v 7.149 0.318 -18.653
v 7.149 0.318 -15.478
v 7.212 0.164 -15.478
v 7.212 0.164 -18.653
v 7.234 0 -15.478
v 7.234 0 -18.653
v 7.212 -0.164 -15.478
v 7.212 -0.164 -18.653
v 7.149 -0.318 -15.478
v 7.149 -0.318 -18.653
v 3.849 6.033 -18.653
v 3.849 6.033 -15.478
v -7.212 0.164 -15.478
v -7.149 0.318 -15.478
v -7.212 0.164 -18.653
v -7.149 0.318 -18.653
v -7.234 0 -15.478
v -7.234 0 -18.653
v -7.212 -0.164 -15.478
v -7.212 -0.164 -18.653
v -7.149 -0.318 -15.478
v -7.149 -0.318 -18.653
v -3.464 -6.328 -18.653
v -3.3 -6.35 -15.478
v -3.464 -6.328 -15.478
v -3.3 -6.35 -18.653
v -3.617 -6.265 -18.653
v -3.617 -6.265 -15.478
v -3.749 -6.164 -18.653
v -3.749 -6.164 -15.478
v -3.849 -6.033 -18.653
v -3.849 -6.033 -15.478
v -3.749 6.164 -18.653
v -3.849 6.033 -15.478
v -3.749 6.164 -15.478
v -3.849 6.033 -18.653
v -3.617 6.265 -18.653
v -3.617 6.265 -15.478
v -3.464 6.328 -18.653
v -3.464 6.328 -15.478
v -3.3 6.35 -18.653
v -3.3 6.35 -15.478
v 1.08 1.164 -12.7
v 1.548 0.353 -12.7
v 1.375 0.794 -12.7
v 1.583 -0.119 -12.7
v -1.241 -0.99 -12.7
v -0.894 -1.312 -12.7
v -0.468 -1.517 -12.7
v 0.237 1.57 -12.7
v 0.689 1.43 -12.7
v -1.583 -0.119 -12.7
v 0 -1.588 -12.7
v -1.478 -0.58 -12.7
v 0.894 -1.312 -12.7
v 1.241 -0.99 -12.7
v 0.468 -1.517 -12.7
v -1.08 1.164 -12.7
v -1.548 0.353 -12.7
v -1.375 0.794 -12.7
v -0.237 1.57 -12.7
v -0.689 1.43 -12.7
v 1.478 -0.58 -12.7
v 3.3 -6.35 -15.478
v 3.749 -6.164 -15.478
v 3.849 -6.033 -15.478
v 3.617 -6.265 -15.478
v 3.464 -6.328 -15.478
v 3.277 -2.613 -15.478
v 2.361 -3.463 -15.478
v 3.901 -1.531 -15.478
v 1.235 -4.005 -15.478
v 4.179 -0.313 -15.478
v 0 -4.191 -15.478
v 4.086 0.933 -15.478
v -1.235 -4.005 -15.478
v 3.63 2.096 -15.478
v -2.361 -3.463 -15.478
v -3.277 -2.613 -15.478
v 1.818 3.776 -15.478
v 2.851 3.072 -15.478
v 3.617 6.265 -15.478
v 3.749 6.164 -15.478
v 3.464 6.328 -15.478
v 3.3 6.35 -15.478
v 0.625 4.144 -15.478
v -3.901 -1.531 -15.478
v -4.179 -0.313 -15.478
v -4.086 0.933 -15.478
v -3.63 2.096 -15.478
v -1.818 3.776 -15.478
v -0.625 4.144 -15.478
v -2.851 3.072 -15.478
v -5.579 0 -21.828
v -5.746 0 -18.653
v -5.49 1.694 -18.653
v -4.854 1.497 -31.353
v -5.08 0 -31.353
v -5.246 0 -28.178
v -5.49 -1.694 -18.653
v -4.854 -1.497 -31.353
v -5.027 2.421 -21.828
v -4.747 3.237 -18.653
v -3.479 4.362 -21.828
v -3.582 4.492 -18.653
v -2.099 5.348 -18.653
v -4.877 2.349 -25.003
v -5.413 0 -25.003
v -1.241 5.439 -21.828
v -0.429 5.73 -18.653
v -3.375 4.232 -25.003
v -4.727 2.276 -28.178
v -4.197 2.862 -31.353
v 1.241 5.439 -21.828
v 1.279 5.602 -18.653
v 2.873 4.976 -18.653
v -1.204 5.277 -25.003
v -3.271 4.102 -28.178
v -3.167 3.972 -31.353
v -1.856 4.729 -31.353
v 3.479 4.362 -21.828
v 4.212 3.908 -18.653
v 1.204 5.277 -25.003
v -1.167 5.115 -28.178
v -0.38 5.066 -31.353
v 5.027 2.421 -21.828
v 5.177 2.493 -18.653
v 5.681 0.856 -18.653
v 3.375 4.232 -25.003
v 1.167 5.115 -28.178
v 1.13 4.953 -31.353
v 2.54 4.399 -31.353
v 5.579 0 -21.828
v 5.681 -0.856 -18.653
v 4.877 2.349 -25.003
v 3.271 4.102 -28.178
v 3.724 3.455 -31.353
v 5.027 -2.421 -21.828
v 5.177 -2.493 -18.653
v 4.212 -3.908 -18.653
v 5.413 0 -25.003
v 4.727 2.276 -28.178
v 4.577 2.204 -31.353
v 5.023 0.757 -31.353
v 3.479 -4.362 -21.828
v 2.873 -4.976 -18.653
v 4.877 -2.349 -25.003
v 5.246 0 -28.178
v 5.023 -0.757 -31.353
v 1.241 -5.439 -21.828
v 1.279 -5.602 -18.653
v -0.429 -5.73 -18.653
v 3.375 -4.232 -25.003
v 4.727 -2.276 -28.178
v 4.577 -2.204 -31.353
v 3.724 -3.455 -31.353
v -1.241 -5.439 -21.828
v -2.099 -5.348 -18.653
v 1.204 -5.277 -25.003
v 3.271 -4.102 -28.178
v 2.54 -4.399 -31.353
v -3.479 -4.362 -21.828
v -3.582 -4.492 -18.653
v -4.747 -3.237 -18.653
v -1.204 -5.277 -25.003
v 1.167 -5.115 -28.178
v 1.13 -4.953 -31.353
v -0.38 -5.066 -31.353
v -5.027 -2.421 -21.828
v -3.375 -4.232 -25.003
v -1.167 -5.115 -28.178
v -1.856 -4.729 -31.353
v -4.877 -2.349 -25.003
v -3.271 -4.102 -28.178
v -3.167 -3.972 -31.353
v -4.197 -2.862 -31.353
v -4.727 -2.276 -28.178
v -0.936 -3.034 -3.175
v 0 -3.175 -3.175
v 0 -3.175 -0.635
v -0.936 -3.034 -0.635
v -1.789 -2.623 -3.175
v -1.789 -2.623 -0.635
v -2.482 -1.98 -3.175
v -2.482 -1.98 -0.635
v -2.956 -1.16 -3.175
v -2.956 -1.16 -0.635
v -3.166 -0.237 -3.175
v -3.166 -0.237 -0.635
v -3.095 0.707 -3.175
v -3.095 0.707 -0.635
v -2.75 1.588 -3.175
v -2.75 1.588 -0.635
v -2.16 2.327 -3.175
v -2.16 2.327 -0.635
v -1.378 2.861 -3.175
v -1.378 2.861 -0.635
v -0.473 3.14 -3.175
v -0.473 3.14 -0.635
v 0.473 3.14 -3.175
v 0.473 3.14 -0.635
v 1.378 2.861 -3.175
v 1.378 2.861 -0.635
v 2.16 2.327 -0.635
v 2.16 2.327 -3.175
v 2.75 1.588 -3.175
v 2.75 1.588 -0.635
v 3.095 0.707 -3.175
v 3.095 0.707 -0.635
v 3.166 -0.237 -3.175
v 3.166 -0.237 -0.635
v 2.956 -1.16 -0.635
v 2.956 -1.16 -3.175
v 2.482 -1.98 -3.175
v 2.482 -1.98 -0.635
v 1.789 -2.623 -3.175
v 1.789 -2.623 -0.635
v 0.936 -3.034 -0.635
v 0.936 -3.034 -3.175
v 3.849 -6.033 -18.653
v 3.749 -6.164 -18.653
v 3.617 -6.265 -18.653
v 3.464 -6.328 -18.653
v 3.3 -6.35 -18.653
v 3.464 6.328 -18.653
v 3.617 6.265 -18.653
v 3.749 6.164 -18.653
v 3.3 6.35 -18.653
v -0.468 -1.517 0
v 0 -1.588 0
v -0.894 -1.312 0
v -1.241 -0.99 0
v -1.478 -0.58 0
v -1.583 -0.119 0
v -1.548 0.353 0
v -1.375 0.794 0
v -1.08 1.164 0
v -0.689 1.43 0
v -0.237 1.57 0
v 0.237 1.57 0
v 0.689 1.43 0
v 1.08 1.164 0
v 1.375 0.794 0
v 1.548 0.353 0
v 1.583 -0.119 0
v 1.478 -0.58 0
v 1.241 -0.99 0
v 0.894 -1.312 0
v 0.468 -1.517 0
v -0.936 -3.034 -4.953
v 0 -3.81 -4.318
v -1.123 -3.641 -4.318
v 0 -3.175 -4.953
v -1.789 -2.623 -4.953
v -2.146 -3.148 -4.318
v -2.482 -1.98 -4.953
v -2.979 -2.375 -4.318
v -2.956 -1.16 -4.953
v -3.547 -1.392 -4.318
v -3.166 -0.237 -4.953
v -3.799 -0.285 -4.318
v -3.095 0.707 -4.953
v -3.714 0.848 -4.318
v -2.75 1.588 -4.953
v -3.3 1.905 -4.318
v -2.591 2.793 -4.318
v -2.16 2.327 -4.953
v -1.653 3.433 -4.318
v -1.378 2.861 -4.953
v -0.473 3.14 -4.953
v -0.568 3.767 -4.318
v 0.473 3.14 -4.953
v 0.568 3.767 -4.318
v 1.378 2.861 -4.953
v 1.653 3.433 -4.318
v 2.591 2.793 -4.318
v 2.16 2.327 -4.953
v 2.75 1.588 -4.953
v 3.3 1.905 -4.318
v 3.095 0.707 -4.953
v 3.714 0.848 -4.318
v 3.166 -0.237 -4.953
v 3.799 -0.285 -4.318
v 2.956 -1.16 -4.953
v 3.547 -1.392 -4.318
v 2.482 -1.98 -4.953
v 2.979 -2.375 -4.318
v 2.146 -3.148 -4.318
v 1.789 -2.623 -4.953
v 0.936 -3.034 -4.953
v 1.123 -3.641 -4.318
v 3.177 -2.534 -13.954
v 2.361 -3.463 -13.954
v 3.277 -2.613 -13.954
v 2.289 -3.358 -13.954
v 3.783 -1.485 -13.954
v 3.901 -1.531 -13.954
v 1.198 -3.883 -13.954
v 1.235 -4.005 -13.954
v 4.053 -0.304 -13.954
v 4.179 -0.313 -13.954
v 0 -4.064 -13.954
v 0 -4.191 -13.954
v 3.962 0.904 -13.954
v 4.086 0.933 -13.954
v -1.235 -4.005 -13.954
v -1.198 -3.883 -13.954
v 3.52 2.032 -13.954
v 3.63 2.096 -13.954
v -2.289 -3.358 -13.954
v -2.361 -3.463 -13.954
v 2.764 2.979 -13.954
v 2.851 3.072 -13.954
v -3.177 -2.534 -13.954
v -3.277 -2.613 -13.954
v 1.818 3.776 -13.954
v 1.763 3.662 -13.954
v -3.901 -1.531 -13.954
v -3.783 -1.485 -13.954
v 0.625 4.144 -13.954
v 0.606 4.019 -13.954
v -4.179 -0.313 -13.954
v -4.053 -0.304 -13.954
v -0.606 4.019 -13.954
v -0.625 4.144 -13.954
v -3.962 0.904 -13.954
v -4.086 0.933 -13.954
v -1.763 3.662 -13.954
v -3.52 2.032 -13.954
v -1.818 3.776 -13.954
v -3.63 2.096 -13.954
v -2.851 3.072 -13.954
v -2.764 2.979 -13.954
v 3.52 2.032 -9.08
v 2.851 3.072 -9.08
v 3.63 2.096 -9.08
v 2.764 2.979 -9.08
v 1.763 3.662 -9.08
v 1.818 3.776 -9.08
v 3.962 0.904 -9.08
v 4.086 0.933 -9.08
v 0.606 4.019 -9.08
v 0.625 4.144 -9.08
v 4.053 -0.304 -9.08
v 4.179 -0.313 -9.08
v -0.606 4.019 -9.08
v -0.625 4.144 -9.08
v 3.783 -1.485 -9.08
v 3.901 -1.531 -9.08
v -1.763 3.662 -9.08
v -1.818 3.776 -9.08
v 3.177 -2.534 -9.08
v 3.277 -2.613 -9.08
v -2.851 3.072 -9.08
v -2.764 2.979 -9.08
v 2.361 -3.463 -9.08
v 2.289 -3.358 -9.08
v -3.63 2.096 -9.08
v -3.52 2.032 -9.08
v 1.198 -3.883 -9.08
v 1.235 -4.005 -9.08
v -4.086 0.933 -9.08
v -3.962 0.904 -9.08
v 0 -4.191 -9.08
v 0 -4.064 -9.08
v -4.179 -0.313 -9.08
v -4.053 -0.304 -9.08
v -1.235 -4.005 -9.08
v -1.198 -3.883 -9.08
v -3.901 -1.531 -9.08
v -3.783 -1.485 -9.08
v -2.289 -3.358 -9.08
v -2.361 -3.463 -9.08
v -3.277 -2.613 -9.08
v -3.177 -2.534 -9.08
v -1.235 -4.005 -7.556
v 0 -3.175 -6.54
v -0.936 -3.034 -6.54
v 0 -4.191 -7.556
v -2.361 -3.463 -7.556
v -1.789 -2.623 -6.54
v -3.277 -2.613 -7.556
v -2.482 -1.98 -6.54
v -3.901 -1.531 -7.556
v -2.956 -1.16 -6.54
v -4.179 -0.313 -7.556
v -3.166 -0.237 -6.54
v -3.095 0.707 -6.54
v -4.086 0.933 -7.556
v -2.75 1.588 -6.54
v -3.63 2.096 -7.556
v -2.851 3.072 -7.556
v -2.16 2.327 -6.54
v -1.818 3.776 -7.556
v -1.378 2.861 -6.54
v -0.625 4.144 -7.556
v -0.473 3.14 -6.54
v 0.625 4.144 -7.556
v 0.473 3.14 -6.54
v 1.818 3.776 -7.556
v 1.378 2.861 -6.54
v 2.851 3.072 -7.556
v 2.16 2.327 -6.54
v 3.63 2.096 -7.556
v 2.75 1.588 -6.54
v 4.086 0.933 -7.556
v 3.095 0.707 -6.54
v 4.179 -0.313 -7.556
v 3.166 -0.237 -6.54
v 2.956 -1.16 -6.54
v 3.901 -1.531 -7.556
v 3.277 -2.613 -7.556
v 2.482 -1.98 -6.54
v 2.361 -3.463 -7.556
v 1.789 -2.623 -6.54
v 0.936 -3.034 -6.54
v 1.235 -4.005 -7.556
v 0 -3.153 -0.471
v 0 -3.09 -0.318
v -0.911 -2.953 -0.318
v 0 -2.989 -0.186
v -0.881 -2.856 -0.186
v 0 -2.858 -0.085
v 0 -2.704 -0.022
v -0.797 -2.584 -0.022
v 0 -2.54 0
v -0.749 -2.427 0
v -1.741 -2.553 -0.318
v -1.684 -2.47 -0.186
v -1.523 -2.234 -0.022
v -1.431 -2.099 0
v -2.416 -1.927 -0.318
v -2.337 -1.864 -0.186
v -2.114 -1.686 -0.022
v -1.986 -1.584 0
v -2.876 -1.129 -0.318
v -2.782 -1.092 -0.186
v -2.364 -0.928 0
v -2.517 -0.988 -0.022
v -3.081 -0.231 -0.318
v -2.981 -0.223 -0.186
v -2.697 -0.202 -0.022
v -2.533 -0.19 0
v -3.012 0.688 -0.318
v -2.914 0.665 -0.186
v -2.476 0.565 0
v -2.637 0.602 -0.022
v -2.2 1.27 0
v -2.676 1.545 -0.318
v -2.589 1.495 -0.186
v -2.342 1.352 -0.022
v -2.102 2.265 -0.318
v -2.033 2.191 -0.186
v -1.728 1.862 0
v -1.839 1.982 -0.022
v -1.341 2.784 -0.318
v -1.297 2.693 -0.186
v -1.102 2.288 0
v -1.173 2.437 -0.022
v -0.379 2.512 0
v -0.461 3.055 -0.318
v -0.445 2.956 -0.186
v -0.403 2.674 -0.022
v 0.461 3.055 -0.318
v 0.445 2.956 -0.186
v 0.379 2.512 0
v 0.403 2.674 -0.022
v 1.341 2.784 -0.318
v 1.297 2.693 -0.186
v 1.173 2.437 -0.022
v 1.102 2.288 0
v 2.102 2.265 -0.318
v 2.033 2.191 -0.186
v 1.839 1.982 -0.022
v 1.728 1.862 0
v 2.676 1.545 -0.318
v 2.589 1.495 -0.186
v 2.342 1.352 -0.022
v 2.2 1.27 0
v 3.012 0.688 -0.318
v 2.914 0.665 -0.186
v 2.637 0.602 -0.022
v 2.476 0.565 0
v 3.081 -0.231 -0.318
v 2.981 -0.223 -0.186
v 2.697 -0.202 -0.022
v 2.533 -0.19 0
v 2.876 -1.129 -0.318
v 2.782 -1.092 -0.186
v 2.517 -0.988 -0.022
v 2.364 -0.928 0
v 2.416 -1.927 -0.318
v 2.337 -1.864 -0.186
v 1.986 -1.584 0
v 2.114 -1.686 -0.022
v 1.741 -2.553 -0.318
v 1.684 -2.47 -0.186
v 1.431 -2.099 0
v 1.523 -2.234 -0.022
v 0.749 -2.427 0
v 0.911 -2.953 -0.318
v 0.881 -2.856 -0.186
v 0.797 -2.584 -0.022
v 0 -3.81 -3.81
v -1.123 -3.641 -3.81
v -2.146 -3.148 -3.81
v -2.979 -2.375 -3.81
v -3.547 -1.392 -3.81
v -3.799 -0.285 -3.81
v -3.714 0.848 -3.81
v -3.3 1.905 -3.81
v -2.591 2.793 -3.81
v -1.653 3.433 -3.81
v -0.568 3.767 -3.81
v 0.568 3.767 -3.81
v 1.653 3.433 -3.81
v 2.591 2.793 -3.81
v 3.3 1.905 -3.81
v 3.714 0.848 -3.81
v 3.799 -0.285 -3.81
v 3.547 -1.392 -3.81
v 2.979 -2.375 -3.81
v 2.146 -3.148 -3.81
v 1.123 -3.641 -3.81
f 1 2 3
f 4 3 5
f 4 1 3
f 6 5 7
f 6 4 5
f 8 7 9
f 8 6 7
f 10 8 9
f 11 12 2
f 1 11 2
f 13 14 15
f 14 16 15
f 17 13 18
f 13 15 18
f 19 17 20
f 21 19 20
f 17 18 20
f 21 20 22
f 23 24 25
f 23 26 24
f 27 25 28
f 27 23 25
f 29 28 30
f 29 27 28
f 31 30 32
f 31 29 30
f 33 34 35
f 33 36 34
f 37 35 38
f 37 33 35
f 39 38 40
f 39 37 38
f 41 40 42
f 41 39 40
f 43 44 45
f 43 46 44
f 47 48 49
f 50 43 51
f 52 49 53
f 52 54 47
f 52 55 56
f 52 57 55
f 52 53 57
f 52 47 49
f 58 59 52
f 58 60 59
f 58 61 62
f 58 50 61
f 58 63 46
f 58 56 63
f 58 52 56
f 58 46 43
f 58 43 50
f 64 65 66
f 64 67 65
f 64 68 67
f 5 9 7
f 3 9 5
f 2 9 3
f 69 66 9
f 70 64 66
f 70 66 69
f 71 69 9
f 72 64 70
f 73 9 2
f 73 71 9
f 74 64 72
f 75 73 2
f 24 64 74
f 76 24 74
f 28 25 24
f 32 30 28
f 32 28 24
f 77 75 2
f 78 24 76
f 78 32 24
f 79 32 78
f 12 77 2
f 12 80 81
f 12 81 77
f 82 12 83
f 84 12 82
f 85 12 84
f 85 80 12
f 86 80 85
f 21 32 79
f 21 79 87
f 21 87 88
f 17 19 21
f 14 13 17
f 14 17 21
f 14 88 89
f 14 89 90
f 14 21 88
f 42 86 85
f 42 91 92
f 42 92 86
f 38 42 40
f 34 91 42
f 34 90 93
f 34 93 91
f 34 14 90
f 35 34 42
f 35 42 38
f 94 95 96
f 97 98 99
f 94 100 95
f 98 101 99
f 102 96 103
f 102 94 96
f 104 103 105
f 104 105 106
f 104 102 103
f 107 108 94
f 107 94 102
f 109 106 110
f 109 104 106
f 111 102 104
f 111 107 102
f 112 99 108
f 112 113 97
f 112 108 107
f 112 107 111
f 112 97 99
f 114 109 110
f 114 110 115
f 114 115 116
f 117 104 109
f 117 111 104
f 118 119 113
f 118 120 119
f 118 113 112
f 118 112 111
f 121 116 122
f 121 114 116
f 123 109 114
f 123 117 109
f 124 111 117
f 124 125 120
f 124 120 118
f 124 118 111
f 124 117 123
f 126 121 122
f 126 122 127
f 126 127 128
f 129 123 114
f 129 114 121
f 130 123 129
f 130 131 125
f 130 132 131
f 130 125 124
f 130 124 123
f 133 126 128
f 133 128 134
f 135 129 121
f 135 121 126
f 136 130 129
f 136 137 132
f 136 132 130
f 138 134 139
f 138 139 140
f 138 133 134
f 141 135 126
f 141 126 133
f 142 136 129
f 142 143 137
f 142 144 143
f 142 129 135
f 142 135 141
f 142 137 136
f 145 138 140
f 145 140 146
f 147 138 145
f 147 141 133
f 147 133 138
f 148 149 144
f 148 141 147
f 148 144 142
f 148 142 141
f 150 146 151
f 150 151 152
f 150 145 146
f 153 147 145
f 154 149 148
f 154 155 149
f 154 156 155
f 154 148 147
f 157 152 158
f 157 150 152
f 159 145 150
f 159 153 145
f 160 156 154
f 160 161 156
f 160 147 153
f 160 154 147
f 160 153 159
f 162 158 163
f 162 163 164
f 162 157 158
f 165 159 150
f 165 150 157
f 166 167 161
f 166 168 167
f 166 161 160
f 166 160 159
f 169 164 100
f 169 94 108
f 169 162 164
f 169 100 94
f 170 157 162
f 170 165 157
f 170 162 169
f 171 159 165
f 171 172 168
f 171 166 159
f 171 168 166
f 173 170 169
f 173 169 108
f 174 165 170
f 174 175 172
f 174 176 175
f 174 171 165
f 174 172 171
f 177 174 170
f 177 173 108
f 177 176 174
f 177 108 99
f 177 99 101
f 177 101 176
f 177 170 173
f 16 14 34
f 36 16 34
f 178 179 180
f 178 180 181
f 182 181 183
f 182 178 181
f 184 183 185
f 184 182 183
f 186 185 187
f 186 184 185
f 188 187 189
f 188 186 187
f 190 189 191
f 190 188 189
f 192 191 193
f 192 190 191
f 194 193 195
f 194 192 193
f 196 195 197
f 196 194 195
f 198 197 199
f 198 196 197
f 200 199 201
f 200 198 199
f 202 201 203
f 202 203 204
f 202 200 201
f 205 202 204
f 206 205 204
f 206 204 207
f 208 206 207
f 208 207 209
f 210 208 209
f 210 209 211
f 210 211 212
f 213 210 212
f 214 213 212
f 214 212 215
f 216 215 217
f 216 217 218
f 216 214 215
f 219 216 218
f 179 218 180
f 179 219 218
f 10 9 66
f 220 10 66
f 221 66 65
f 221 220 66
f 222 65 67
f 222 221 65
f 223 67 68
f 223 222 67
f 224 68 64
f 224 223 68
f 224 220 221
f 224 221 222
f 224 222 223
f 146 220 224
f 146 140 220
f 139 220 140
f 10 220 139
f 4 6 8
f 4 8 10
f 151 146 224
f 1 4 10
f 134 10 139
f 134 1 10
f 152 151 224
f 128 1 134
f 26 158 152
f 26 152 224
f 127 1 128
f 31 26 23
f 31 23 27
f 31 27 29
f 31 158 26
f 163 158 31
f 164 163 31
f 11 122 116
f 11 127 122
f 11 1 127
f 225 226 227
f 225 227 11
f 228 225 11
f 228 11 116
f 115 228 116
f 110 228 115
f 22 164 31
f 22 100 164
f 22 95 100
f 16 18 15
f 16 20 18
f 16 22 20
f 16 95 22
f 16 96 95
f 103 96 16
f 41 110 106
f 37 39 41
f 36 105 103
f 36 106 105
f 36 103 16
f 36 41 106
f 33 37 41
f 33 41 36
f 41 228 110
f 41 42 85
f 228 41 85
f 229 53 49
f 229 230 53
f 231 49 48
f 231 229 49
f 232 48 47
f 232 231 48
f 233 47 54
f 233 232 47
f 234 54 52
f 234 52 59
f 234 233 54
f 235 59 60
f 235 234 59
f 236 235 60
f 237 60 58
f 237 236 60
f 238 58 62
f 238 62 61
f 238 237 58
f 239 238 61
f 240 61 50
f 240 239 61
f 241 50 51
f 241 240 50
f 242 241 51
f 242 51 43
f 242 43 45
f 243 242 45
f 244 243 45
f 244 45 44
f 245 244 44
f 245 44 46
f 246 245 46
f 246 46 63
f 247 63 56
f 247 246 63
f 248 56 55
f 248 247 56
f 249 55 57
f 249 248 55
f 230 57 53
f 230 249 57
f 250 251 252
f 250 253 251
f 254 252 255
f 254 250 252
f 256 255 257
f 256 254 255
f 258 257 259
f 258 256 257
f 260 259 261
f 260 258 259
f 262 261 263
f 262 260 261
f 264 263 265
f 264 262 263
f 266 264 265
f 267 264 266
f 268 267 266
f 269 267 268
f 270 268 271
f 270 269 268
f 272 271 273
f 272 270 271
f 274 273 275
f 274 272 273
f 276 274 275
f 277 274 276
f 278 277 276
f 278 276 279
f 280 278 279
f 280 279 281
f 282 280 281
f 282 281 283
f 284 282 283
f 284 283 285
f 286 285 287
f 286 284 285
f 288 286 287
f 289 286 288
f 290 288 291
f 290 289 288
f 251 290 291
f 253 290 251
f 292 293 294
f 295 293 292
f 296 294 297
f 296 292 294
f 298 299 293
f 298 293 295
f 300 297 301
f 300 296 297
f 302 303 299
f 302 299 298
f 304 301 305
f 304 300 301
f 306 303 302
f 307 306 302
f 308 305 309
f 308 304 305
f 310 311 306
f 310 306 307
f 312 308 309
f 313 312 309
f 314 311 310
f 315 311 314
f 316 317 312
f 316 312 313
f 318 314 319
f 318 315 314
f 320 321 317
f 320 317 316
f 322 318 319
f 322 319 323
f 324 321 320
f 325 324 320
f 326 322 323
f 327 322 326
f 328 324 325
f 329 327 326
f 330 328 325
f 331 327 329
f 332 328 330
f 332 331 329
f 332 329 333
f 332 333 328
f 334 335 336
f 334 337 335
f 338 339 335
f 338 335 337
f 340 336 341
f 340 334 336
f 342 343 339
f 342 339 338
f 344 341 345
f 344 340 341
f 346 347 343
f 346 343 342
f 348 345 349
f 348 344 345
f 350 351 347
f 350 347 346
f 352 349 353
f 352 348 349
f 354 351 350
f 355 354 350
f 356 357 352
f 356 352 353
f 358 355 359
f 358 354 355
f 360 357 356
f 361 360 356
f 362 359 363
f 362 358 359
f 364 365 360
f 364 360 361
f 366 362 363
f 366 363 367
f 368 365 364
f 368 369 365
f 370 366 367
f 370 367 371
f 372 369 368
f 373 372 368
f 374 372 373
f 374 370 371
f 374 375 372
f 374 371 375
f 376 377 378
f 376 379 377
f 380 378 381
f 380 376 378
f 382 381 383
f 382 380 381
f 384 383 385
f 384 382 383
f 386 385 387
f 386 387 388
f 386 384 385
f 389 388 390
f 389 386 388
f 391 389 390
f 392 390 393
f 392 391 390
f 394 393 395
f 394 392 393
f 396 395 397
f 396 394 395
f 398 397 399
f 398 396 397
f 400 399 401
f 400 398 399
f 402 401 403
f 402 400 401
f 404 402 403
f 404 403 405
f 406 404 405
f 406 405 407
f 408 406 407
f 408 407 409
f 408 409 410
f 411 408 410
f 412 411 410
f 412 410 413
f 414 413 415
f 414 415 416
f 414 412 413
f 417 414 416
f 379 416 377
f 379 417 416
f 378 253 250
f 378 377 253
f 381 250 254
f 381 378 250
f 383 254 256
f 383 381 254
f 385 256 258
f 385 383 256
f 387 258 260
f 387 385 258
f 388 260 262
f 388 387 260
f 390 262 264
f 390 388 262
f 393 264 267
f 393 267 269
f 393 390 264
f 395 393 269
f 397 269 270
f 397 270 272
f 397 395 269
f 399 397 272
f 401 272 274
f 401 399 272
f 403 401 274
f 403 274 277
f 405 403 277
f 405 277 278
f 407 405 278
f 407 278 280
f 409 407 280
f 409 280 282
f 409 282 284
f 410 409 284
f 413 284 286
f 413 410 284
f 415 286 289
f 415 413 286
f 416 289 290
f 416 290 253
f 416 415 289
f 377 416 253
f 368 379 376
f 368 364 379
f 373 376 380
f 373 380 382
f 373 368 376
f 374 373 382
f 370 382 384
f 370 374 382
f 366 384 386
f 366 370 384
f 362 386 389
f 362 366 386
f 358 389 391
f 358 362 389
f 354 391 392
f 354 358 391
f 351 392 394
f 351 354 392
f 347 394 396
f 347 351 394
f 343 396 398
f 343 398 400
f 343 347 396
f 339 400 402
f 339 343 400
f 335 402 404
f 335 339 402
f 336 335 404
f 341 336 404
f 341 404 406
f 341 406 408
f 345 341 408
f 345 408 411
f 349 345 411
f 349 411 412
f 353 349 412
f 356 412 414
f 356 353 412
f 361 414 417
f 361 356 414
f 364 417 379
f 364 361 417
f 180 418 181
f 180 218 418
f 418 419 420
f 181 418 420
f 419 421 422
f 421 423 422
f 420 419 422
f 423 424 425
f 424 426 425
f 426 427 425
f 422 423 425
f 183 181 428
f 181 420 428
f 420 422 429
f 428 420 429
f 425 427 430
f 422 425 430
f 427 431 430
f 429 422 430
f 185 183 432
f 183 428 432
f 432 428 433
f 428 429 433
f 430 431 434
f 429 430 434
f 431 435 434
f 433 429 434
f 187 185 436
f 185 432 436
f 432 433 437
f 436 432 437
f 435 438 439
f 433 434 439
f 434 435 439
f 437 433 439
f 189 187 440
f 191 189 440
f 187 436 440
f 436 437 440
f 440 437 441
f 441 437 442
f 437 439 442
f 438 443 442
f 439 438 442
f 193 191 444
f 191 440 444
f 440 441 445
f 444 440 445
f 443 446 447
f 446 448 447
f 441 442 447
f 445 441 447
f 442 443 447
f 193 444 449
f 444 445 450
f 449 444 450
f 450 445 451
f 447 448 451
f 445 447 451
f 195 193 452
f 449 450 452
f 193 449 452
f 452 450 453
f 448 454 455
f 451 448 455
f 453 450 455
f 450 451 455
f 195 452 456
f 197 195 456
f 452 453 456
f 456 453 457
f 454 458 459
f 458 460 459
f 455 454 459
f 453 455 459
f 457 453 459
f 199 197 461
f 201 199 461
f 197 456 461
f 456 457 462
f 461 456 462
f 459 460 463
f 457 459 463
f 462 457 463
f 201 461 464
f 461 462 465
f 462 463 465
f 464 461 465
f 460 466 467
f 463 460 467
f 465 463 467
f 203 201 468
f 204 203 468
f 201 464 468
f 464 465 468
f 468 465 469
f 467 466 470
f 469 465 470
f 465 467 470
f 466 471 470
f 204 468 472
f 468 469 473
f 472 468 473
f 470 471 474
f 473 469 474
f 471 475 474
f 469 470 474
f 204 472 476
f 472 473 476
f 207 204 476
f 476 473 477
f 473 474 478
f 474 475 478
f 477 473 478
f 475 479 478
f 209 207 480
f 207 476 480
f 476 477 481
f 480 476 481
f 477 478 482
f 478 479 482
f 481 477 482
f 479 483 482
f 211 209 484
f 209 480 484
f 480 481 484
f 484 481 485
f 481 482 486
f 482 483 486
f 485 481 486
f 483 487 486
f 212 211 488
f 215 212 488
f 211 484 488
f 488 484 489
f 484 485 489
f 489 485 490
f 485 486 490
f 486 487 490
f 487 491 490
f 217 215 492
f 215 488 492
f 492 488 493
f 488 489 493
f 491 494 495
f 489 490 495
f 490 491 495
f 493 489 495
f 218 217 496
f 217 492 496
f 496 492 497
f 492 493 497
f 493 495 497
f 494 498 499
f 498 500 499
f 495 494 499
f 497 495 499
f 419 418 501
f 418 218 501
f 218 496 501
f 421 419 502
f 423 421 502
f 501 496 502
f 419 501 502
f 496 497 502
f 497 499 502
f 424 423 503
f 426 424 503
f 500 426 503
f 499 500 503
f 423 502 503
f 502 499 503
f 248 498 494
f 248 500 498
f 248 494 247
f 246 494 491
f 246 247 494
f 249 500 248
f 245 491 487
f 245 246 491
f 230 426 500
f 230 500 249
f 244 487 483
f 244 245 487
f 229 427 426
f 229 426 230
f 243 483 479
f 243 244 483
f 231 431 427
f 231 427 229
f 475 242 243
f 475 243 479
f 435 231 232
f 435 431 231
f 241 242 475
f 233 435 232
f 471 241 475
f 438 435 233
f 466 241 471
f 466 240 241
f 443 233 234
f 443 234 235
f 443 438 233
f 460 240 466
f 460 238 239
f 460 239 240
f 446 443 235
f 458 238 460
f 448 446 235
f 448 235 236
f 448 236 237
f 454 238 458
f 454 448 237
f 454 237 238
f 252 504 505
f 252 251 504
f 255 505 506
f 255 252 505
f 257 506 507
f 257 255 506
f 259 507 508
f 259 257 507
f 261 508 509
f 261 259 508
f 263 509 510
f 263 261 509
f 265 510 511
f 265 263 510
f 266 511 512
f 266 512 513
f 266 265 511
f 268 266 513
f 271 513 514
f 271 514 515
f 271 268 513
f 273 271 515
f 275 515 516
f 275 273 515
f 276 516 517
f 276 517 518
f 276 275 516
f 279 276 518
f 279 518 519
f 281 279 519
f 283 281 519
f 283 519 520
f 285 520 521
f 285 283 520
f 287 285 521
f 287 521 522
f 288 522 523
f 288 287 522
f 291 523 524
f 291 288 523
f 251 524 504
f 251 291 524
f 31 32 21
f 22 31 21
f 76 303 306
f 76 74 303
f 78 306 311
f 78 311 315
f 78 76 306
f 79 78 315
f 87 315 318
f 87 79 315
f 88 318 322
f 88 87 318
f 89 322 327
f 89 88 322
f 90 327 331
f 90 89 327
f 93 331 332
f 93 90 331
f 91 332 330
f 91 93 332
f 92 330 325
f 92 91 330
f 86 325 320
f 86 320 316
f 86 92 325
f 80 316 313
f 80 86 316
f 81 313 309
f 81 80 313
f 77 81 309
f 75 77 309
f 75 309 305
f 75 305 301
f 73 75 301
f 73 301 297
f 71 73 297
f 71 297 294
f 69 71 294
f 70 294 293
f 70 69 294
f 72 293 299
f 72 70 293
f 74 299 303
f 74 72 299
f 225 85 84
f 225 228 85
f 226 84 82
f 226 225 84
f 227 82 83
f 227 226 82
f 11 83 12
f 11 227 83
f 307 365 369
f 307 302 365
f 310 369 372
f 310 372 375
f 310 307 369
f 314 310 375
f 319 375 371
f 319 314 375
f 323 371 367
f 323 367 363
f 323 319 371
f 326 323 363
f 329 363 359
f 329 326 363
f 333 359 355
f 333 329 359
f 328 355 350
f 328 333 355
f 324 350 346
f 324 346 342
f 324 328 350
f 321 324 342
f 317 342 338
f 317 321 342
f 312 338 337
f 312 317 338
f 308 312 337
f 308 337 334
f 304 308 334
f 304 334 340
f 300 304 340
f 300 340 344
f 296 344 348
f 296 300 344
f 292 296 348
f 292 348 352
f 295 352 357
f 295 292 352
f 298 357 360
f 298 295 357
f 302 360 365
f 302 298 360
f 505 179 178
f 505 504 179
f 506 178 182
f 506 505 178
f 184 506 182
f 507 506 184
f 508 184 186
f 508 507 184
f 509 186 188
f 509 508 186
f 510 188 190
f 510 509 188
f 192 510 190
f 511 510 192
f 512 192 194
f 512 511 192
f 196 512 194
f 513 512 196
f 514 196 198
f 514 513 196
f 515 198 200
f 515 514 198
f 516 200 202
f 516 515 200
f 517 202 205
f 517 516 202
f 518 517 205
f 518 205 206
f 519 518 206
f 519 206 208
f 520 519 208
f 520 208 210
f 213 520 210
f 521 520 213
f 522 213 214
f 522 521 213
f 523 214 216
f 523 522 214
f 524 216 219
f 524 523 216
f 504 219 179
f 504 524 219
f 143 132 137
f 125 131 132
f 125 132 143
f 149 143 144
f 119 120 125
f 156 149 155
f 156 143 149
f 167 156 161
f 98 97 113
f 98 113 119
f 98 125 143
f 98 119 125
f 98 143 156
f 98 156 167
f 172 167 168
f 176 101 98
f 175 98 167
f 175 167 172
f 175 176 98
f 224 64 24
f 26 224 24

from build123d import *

# Parameters (mm, degrees)
SKETCH2_R          = 31.732831761
CUT_EXTRUDE1_DEPTH = 26.78316707
SKETCH3_R          = 11.120214541
SKETCH3_R_2        = 5.08
CUT_EXTRUDE2_DEPTH = 12.7
CUT_EXTRUDE2_DRAFT = -3
FILLET1_R          = 0.635


with BuildPart() as part:
    # Sketch1 → Revolve1 (revolve)
    with BuildSketch(Plane(origin=(0, 0, 0), x_dir=(0, 0, -1), z_dir=(1, 0, 0)), mode=Mode.PRIVATE) as revolve1_sk:
        Polygon((3.175, 3.175), (3.81, 3.81), (4.318, 3.81), (4.953, 3.175), (6.5405, 3.175), (7.5565, 4.191), (9.0805, 4.191), (9.0805, 4.064), (13.954125, 4.064), (13.954125, 4.191), (15.478125, 4.191), (15.478125, 14.36586369), (31.353125, 14.36586369), (31.353125, 0), (12.7, 0), (12.7, 1.5875), (0, 1.5875), (0, 3.175), align=None)
    revolve(revolve1_sk.sketch.rotate(Axis((0, 0, -12.7), (0, 0, -1)), 180), axis=Axis((0, 0, -12.7), (0, 0, -1)))

    # Sketch2 → Cut-Extrude1 (cut, through all)
    with BuildSketch(Plane(origin=(0, 0, -15.478125), x_dir=(-1, 0, 0), z_dir=(0, 0, -1))):
        Circle(SKETCH2_R)
        Polygon((7.332348419, 0), (3.666174209, 6.35), (-3.666174209, 6.35), (-7.332348419, 0), (-3.666174209, -6.35), (3.666174209, -6.35), align=None, mode=Mode.SUBTRACT)
    extrude(amount=CUT_EXTRUDE1_DEPTH, mode=Mode.SUBTRACT)


with BuildPart() as cut_extrude2_tool:
    # Sketch3 → Cut-Extrude2 (with draft: the straight prism first)
    with BuildSketch(Plane(origin=(0, 0, -31.353125), x_dir=(-1, 0, 0), z_dir=(0, 0, -1))):
        Circle(SKETCH3_R)
        Circle(SKETCH3_R_2, mode=Mode.SUBTRACT)
    extrude(amount=-CUT_EXTRUDE2_DEPTH)
    # Cut-Extrude2: the draft: its side faces are tilted about the plane it starts from
    cut_extrude2_sides = [cut_extrude2_tool.faces().sort_by_distance(p)[0] for p in [
        (11.120214541, 0, -25.003125),
        (5.08, 0, -25.003125),
    ]]
    draft(cut_extrude2_sides, Plane(origin=(0, 0, -31.353125), x_dir=(-1, 0, 0), z_dir=(0, 0, -1)), CUT_EXTRUDE2_DRAFT)


with BuildPart() as part_1:
    add(part.part)

    # Cut-Extrude2: cut by cut_extrude2_tool
    add(cut_extrude2_tool.part, mode=Mode.SUBTRACT)

    # Fillet1
    fillet1_edges = [part_1.edges().sort_by_distance(p)[0] for p in [
        (0, 3.175, 0),
        (-3.666174209, -6.35, -17.065625),
        (3.666174209, -6.35, -17.065625),
        (7.332348419, 0, -17.065625),
        (3.666174209, 6.35, -17.065625),
        (-3.666174209, 6.35, -17.065625),
        (-7.332348419, 0, -17.065625),
    ]]
    fillet(fillet1_edges, radius=FILLET1_R)


solid = part_1.part
